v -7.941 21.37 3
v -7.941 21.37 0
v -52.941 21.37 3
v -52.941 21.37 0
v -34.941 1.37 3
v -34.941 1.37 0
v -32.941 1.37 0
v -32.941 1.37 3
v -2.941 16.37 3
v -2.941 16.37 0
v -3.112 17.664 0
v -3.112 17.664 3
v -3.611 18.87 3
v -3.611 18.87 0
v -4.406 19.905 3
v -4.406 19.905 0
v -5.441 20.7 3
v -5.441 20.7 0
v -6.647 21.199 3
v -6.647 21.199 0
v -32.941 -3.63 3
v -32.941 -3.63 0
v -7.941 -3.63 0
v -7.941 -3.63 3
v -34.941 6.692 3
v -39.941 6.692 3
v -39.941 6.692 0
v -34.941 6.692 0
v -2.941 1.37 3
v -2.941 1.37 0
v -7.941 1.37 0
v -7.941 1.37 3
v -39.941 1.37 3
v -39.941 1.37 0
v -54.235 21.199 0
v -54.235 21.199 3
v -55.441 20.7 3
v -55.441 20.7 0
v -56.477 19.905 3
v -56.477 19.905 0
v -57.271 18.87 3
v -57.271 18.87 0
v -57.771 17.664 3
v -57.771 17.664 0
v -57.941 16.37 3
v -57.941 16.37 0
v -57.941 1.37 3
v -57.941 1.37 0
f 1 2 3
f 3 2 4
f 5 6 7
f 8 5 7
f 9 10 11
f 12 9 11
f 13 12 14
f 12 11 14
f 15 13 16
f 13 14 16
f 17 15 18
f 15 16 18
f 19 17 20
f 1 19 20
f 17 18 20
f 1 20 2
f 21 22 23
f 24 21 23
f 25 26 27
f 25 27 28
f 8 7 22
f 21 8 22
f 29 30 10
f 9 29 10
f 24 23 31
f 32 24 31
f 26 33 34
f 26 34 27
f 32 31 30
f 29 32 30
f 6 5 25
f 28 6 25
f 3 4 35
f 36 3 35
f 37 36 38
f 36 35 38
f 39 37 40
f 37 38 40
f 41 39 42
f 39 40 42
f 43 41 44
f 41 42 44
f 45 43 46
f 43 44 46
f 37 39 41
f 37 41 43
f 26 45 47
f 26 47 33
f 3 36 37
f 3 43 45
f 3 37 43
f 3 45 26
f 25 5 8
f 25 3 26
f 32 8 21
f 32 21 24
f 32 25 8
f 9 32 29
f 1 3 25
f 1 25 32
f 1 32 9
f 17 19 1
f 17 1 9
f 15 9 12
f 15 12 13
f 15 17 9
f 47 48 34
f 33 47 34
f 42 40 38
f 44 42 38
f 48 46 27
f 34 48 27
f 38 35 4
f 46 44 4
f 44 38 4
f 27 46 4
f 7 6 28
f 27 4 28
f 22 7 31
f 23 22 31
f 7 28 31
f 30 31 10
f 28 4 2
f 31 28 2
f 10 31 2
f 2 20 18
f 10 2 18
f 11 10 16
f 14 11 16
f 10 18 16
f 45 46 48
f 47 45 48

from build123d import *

# Parameters (mm, degrees)
RESSALTO_EXTRUS_O1_DEPTH = 3
ESBO_O3_W                = 5
ESBO_O3_H                = 5.322149945
CORTE_EXTRUS_O2_DEPTH    = 4


with BuildPart() as part:
    # Esboço1 → Ressalto-extrusão1 (new body)
    with BuildSketch(Plane.XY):
        with BuildLine():
            Line((-7.94118013, 1.369756817), (-2.94118013, 1.369756817))
            Line((-2.94118013, 1.369756817), (-2.94118013, 16.369756817))
            ThreePointArc((-2.94118013, 16.369756817), (-4.405646224, 19.905290723), (-7.94118013, 21.369756817))
            Line((-7.94118013, 21.369756817), (-52.94118013, 21.369756817))
            ThreePointArc((-52.94118013, 21.369756817), (-56.476714036, 19.905290723), (-57.94118013, 16.369756817))
            Line((-57.94118013, 16.369756817), (-57.94118013, 1.369756817))
            Line((-57.94118013, 1.369756817), (-32.94118013, 1.369756817))
            Line((-32.94118013, 1.369756817), (-32.94118013, -3.630243183))
            Line((-32.94118013, -3.630243183), (-7.94118013, -3.630243183))
            Line((-7.94118013, -3.630243183), (-7.94118013, 1.369756817))
        make_face()
    extrude(amount=RESSALTO_EXTRUS_O1_DEPTH)

    # Esboço3 → Corte-extrusão2 (cut, through all)
    with BuildSketch(Plane.XY.offset(3)):
        with Locations((-37.44118013, 4.03083179)):
            Rectangle(ESBO_O3_W, ESBO_O3_H)
    extrude(amount=-CORTE_EXTRUS_O2_DEPTH, mode=Mode.SUBTRACT)


solid = part.part
